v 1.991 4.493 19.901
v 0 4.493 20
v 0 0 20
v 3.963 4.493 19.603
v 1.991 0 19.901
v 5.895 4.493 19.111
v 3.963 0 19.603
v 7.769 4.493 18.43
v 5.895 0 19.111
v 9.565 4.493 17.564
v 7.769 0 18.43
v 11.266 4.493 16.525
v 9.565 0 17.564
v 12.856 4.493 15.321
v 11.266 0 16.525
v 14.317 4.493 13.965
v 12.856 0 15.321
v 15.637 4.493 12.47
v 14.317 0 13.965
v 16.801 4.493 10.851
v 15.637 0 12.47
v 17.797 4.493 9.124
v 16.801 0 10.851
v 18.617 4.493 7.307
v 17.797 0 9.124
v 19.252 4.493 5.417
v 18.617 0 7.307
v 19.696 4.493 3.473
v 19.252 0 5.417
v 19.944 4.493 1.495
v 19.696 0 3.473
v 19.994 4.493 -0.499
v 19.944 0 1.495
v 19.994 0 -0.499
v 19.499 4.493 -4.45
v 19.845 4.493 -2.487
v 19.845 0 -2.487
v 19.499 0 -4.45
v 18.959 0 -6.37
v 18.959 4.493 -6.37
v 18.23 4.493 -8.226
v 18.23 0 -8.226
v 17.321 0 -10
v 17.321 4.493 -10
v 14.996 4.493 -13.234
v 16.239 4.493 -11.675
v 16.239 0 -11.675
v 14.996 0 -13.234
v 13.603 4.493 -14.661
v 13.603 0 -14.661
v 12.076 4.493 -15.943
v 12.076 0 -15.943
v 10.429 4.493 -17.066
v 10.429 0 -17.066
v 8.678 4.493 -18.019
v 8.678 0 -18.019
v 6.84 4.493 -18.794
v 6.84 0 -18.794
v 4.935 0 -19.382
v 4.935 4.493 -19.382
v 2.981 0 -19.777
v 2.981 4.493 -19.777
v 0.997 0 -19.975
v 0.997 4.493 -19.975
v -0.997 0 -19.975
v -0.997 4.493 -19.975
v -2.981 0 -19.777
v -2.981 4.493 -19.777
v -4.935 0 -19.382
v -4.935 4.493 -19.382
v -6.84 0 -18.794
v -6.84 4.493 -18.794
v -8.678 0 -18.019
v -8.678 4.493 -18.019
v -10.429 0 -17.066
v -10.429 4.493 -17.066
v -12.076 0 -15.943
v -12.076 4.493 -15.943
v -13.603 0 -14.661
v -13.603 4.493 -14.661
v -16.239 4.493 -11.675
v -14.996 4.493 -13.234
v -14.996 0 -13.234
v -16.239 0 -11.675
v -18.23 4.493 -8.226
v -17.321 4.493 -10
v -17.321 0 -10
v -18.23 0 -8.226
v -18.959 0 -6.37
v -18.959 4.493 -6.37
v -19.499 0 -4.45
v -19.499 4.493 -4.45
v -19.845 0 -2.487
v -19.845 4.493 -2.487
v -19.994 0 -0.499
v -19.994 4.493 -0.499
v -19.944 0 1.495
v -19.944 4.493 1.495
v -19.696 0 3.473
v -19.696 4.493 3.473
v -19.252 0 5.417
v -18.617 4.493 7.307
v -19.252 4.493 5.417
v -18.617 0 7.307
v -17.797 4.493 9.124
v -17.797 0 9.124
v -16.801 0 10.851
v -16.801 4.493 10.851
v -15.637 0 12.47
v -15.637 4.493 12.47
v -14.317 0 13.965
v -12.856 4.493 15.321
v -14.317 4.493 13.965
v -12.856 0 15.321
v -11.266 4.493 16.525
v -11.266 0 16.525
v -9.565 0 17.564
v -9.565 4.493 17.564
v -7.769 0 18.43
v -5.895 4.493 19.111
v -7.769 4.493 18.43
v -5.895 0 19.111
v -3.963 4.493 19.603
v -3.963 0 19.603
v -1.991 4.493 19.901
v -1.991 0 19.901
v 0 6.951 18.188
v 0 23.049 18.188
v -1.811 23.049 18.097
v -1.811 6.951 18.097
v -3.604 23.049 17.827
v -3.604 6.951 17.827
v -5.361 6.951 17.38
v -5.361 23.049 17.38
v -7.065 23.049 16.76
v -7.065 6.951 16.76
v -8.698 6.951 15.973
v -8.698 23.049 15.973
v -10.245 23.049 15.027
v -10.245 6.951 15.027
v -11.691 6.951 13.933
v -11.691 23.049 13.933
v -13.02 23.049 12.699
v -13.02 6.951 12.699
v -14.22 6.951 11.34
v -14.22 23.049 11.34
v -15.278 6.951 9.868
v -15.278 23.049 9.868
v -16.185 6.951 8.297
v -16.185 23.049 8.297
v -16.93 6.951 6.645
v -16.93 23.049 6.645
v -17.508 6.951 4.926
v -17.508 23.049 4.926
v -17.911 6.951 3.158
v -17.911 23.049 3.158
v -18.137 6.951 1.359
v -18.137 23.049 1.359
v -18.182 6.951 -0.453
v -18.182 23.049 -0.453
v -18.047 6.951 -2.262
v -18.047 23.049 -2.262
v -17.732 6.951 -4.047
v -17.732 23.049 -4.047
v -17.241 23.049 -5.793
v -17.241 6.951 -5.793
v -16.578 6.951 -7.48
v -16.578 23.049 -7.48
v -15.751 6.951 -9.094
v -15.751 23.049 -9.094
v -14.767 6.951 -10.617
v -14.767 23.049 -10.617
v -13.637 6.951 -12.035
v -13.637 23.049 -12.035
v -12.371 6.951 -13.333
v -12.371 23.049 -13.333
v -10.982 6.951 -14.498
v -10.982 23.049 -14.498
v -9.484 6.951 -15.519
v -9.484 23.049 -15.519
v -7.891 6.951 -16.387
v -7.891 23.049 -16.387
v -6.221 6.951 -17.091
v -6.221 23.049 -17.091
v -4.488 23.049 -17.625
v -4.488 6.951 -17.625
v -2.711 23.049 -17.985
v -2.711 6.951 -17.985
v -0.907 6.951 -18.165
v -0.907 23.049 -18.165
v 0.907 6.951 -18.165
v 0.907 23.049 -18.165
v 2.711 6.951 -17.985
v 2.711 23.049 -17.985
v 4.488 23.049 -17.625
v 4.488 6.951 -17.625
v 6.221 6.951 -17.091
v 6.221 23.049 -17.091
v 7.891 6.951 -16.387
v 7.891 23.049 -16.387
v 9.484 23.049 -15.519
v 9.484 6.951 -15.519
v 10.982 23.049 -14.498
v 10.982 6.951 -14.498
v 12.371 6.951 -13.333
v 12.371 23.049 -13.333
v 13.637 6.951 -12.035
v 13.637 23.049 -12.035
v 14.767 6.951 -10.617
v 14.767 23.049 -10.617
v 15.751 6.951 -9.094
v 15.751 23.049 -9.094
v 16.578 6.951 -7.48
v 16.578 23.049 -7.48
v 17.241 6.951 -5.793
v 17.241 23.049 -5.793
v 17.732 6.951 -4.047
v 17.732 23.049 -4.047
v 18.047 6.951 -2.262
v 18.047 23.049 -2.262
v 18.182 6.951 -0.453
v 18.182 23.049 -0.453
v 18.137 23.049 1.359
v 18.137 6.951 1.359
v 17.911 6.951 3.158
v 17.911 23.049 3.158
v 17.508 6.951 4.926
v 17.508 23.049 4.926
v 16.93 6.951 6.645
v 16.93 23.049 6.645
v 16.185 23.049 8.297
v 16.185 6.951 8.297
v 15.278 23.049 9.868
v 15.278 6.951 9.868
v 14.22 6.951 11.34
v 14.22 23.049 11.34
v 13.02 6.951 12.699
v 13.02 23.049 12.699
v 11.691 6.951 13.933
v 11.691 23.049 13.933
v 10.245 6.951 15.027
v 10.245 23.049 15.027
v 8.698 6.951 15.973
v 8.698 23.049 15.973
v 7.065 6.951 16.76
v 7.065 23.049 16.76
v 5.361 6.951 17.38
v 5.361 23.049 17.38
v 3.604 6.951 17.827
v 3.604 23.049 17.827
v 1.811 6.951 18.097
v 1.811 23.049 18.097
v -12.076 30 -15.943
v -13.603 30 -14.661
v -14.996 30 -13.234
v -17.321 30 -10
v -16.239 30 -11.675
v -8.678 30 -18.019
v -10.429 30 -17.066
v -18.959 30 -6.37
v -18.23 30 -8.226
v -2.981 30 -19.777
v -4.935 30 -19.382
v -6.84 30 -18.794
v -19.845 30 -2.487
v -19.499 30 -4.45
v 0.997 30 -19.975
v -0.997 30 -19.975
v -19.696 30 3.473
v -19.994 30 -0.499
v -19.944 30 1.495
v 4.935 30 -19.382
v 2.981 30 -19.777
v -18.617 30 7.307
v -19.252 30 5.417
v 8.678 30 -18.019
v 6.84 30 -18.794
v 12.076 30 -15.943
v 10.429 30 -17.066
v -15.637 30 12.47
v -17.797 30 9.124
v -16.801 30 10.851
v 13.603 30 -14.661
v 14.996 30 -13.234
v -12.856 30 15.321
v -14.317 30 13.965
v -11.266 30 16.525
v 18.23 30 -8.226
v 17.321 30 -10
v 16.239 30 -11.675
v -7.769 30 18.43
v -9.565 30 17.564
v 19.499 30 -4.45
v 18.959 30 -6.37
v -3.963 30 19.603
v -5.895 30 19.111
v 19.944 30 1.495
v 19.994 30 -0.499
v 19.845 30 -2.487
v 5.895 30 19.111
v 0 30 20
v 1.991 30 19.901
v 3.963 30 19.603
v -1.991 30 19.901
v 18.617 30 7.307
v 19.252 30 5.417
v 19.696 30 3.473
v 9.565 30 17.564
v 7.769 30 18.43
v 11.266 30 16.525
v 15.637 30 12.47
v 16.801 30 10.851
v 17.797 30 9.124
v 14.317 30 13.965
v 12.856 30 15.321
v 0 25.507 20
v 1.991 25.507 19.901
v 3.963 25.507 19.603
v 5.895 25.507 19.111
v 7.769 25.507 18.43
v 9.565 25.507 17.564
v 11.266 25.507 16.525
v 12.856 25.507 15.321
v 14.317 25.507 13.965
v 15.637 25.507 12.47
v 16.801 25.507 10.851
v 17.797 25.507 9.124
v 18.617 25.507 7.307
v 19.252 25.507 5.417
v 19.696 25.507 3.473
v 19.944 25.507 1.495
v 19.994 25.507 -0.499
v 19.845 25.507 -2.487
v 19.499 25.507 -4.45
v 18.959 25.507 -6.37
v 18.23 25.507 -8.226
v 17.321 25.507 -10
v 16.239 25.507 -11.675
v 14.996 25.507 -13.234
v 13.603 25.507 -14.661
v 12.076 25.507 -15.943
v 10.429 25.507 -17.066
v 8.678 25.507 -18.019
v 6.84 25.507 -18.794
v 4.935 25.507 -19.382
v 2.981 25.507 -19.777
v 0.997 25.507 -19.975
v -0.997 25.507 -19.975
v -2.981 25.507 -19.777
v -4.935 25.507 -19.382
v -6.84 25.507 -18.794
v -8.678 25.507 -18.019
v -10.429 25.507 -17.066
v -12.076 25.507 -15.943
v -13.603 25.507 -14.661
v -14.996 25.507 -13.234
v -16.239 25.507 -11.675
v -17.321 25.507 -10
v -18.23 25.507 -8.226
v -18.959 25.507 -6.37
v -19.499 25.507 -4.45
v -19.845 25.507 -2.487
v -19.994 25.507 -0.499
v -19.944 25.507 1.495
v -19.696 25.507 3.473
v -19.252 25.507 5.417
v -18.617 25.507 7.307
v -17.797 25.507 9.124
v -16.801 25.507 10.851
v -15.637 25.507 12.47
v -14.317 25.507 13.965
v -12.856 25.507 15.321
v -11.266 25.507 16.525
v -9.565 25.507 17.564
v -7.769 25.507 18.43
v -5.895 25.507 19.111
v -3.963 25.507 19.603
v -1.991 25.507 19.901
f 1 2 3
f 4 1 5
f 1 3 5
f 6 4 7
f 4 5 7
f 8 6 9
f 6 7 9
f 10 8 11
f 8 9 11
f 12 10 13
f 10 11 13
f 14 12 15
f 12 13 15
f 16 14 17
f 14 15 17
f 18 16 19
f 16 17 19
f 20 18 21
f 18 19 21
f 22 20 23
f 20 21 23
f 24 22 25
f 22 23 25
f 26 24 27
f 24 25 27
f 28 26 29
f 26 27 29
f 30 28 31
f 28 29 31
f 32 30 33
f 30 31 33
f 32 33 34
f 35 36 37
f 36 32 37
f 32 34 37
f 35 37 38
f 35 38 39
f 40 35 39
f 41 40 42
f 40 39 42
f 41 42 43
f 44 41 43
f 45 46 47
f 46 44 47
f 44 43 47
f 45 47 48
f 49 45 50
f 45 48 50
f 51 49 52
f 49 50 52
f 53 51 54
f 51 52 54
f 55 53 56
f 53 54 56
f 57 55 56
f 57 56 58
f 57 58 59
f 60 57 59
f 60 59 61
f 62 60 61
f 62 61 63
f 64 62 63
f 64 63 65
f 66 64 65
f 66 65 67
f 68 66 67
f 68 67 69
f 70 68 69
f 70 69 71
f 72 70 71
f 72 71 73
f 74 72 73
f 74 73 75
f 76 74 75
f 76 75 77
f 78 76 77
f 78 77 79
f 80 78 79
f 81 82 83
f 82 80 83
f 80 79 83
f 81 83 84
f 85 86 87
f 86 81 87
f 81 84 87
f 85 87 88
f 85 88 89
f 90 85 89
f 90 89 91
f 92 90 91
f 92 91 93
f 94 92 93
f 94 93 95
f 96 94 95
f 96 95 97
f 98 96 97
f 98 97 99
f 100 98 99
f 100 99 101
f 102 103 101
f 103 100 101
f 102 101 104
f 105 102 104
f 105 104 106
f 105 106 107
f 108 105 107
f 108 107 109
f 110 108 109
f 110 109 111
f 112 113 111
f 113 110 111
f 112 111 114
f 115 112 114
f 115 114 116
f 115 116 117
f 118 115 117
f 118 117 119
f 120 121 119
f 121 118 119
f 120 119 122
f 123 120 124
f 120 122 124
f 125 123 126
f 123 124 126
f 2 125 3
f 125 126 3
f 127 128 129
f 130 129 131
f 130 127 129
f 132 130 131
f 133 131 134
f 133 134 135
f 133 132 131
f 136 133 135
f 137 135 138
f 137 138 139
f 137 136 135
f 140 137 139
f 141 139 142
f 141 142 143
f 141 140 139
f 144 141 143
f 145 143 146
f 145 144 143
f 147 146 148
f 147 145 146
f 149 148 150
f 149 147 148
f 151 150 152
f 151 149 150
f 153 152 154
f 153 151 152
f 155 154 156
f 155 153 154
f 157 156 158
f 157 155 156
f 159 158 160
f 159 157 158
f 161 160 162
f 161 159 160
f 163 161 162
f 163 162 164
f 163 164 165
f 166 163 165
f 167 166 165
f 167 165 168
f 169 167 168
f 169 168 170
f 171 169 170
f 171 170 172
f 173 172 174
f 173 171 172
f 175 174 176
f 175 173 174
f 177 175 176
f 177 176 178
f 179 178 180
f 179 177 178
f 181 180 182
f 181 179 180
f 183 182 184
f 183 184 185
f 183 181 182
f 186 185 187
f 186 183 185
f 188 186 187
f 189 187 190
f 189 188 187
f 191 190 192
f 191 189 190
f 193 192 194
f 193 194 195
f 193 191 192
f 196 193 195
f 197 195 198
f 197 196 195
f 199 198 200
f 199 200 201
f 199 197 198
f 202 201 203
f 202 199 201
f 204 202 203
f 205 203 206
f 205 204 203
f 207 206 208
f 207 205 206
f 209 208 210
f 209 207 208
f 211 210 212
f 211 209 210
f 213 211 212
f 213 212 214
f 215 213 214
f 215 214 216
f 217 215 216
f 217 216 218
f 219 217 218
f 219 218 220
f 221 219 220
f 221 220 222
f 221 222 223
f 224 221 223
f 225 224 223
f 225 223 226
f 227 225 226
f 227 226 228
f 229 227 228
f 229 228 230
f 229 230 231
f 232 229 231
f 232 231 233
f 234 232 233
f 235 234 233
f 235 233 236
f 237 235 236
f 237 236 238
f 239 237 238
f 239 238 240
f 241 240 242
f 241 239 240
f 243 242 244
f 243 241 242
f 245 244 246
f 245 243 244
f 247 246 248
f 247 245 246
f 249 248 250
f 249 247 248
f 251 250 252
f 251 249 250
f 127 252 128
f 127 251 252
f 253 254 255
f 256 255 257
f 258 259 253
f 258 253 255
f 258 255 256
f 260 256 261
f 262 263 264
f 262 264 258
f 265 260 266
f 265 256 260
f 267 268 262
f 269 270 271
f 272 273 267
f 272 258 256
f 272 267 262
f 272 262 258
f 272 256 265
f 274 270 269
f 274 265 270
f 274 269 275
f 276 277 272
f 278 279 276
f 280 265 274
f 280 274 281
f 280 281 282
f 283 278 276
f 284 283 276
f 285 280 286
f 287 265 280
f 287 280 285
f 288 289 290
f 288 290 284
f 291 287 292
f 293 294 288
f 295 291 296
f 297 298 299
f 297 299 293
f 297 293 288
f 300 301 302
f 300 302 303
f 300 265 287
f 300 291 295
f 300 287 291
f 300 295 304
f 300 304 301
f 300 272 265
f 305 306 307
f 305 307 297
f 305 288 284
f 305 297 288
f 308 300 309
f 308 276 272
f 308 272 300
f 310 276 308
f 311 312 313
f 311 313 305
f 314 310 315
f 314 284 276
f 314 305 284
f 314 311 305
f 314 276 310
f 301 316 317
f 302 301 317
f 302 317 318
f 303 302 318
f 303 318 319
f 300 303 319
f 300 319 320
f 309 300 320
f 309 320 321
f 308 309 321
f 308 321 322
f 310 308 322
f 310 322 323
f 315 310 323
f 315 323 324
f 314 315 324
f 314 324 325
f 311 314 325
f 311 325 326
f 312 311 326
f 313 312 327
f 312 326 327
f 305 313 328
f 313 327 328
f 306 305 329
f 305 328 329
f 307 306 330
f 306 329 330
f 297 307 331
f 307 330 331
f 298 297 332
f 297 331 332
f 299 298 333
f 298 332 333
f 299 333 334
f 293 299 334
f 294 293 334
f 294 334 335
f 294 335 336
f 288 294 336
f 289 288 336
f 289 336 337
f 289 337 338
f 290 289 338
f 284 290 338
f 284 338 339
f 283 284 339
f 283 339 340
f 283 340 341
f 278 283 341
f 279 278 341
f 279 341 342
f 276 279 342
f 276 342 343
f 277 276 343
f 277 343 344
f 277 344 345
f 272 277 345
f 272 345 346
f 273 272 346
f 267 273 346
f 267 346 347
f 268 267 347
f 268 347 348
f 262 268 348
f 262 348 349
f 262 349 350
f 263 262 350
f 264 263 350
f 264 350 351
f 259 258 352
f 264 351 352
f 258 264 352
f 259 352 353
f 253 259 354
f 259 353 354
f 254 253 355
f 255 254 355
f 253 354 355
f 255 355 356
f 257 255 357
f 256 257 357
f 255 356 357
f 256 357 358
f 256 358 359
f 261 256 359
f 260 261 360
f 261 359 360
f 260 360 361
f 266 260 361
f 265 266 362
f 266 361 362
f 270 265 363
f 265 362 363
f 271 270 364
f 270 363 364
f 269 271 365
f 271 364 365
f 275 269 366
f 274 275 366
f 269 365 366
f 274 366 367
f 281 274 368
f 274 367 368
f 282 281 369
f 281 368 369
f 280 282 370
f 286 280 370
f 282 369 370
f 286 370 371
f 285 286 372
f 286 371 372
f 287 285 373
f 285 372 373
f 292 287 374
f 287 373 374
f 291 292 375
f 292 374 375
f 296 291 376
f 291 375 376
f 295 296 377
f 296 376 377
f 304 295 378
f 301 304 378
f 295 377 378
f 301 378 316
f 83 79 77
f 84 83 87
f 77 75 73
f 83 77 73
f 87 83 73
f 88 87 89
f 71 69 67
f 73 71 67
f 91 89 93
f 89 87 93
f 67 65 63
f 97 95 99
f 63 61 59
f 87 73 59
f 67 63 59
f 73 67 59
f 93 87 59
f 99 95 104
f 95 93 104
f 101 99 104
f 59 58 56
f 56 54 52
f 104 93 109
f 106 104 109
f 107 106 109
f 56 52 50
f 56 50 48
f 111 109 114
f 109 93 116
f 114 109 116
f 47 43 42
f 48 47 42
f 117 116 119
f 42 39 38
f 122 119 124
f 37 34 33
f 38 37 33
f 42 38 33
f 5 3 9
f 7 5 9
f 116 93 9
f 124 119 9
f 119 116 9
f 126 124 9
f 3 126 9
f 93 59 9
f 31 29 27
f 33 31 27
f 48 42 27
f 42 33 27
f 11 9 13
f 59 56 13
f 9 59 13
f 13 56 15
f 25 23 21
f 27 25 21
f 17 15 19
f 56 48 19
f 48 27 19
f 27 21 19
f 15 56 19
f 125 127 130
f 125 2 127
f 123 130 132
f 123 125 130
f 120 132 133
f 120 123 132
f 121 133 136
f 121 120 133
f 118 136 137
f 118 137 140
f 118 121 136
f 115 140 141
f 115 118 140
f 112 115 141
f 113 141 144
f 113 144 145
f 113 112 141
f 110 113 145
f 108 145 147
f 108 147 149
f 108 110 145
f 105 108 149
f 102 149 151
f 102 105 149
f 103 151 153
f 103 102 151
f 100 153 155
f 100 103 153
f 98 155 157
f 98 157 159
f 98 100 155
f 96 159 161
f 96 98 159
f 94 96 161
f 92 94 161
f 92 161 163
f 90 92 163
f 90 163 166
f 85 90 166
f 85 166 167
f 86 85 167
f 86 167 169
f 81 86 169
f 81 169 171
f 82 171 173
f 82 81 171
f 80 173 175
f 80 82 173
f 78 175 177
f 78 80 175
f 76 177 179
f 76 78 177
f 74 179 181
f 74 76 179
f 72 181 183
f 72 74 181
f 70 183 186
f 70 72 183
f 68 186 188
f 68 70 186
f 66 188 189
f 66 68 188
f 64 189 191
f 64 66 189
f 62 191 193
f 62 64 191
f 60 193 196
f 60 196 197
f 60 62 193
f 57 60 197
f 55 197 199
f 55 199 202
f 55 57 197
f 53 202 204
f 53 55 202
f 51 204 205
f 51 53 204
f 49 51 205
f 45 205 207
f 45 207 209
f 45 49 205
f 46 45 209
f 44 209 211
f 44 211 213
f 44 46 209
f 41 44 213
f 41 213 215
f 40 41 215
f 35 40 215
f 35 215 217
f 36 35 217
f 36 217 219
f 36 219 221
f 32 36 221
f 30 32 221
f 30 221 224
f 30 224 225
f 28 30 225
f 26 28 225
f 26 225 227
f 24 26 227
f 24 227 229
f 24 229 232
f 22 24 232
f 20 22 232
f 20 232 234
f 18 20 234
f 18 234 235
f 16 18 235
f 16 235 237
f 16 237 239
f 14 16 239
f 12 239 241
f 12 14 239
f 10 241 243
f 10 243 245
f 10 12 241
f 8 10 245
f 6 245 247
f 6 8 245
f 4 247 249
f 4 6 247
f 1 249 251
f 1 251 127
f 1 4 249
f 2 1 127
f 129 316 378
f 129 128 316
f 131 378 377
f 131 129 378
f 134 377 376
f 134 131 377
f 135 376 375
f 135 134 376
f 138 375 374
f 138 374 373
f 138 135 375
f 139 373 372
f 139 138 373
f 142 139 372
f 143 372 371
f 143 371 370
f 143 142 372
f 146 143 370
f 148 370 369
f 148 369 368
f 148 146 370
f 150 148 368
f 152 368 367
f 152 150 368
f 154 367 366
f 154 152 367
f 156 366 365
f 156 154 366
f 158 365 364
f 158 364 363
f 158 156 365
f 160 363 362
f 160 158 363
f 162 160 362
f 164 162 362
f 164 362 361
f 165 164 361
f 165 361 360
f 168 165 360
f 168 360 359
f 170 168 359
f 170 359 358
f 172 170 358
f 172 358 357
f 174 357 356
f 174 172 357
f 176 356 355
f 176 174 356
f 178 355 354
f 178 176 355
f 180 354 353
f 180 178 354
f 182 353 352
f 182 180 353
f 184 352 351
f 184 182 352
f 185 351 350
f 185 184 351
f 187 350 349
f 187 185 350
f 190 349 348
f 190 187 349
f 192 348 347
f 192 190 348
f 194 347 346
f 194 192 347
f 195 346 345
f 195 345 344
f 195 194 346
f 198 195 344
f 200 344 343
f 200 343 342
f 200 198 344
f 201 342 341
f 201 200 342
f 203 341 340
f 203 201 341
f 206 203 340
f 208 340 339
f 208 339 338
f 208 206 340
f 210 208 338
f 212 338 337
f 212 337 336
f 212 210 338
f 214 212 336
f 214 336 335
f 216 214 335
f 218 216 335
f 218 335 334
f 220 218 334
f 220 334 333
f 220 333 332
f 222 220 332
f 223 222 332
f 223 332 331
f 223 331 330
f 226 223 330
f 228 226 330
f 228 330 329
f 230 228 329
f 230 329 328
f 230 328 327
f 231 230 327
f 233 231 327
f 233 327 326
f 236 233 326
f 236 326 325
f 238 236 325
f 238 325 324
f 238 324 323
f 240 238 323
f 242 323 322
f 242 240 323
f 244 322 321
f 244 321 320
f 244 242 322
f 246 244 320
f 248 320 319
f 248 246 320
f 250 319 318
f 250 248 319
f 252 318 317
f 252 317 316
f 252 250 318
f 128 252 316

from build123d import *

# Parameters (mm, degrees)
SKETCH2_R           = 20
BOSS_EXTRUDE1_DEPTH = 30


with BuildPart() as part:
    # Sketch2 → Boss-Extrude1 (new body)
    with BuildSketch(Plane(origin=(0, 0, 0), x_dir=(1, 0, 0), z_dir=(0, 1, 0))):
        Circle(SKETCH2_R)
    extrude(amount=BOSS_EXTRUDE1_DEPTH)

    # Sketch3 → Cut-Revolve1 (revolve, cut)
    with BuildSketch(Plane.XY):
        Polygon((-20, 25.507054769), (-18.187675722, 23.049442392), (-18.187675722, 6.950557608), (-20, 4.492945231), align=None)
    revolve(axis=Axis((0, 30, 0), (0, -1, 0)), mode=Mode.SUBTRACT)


solid = part.part
